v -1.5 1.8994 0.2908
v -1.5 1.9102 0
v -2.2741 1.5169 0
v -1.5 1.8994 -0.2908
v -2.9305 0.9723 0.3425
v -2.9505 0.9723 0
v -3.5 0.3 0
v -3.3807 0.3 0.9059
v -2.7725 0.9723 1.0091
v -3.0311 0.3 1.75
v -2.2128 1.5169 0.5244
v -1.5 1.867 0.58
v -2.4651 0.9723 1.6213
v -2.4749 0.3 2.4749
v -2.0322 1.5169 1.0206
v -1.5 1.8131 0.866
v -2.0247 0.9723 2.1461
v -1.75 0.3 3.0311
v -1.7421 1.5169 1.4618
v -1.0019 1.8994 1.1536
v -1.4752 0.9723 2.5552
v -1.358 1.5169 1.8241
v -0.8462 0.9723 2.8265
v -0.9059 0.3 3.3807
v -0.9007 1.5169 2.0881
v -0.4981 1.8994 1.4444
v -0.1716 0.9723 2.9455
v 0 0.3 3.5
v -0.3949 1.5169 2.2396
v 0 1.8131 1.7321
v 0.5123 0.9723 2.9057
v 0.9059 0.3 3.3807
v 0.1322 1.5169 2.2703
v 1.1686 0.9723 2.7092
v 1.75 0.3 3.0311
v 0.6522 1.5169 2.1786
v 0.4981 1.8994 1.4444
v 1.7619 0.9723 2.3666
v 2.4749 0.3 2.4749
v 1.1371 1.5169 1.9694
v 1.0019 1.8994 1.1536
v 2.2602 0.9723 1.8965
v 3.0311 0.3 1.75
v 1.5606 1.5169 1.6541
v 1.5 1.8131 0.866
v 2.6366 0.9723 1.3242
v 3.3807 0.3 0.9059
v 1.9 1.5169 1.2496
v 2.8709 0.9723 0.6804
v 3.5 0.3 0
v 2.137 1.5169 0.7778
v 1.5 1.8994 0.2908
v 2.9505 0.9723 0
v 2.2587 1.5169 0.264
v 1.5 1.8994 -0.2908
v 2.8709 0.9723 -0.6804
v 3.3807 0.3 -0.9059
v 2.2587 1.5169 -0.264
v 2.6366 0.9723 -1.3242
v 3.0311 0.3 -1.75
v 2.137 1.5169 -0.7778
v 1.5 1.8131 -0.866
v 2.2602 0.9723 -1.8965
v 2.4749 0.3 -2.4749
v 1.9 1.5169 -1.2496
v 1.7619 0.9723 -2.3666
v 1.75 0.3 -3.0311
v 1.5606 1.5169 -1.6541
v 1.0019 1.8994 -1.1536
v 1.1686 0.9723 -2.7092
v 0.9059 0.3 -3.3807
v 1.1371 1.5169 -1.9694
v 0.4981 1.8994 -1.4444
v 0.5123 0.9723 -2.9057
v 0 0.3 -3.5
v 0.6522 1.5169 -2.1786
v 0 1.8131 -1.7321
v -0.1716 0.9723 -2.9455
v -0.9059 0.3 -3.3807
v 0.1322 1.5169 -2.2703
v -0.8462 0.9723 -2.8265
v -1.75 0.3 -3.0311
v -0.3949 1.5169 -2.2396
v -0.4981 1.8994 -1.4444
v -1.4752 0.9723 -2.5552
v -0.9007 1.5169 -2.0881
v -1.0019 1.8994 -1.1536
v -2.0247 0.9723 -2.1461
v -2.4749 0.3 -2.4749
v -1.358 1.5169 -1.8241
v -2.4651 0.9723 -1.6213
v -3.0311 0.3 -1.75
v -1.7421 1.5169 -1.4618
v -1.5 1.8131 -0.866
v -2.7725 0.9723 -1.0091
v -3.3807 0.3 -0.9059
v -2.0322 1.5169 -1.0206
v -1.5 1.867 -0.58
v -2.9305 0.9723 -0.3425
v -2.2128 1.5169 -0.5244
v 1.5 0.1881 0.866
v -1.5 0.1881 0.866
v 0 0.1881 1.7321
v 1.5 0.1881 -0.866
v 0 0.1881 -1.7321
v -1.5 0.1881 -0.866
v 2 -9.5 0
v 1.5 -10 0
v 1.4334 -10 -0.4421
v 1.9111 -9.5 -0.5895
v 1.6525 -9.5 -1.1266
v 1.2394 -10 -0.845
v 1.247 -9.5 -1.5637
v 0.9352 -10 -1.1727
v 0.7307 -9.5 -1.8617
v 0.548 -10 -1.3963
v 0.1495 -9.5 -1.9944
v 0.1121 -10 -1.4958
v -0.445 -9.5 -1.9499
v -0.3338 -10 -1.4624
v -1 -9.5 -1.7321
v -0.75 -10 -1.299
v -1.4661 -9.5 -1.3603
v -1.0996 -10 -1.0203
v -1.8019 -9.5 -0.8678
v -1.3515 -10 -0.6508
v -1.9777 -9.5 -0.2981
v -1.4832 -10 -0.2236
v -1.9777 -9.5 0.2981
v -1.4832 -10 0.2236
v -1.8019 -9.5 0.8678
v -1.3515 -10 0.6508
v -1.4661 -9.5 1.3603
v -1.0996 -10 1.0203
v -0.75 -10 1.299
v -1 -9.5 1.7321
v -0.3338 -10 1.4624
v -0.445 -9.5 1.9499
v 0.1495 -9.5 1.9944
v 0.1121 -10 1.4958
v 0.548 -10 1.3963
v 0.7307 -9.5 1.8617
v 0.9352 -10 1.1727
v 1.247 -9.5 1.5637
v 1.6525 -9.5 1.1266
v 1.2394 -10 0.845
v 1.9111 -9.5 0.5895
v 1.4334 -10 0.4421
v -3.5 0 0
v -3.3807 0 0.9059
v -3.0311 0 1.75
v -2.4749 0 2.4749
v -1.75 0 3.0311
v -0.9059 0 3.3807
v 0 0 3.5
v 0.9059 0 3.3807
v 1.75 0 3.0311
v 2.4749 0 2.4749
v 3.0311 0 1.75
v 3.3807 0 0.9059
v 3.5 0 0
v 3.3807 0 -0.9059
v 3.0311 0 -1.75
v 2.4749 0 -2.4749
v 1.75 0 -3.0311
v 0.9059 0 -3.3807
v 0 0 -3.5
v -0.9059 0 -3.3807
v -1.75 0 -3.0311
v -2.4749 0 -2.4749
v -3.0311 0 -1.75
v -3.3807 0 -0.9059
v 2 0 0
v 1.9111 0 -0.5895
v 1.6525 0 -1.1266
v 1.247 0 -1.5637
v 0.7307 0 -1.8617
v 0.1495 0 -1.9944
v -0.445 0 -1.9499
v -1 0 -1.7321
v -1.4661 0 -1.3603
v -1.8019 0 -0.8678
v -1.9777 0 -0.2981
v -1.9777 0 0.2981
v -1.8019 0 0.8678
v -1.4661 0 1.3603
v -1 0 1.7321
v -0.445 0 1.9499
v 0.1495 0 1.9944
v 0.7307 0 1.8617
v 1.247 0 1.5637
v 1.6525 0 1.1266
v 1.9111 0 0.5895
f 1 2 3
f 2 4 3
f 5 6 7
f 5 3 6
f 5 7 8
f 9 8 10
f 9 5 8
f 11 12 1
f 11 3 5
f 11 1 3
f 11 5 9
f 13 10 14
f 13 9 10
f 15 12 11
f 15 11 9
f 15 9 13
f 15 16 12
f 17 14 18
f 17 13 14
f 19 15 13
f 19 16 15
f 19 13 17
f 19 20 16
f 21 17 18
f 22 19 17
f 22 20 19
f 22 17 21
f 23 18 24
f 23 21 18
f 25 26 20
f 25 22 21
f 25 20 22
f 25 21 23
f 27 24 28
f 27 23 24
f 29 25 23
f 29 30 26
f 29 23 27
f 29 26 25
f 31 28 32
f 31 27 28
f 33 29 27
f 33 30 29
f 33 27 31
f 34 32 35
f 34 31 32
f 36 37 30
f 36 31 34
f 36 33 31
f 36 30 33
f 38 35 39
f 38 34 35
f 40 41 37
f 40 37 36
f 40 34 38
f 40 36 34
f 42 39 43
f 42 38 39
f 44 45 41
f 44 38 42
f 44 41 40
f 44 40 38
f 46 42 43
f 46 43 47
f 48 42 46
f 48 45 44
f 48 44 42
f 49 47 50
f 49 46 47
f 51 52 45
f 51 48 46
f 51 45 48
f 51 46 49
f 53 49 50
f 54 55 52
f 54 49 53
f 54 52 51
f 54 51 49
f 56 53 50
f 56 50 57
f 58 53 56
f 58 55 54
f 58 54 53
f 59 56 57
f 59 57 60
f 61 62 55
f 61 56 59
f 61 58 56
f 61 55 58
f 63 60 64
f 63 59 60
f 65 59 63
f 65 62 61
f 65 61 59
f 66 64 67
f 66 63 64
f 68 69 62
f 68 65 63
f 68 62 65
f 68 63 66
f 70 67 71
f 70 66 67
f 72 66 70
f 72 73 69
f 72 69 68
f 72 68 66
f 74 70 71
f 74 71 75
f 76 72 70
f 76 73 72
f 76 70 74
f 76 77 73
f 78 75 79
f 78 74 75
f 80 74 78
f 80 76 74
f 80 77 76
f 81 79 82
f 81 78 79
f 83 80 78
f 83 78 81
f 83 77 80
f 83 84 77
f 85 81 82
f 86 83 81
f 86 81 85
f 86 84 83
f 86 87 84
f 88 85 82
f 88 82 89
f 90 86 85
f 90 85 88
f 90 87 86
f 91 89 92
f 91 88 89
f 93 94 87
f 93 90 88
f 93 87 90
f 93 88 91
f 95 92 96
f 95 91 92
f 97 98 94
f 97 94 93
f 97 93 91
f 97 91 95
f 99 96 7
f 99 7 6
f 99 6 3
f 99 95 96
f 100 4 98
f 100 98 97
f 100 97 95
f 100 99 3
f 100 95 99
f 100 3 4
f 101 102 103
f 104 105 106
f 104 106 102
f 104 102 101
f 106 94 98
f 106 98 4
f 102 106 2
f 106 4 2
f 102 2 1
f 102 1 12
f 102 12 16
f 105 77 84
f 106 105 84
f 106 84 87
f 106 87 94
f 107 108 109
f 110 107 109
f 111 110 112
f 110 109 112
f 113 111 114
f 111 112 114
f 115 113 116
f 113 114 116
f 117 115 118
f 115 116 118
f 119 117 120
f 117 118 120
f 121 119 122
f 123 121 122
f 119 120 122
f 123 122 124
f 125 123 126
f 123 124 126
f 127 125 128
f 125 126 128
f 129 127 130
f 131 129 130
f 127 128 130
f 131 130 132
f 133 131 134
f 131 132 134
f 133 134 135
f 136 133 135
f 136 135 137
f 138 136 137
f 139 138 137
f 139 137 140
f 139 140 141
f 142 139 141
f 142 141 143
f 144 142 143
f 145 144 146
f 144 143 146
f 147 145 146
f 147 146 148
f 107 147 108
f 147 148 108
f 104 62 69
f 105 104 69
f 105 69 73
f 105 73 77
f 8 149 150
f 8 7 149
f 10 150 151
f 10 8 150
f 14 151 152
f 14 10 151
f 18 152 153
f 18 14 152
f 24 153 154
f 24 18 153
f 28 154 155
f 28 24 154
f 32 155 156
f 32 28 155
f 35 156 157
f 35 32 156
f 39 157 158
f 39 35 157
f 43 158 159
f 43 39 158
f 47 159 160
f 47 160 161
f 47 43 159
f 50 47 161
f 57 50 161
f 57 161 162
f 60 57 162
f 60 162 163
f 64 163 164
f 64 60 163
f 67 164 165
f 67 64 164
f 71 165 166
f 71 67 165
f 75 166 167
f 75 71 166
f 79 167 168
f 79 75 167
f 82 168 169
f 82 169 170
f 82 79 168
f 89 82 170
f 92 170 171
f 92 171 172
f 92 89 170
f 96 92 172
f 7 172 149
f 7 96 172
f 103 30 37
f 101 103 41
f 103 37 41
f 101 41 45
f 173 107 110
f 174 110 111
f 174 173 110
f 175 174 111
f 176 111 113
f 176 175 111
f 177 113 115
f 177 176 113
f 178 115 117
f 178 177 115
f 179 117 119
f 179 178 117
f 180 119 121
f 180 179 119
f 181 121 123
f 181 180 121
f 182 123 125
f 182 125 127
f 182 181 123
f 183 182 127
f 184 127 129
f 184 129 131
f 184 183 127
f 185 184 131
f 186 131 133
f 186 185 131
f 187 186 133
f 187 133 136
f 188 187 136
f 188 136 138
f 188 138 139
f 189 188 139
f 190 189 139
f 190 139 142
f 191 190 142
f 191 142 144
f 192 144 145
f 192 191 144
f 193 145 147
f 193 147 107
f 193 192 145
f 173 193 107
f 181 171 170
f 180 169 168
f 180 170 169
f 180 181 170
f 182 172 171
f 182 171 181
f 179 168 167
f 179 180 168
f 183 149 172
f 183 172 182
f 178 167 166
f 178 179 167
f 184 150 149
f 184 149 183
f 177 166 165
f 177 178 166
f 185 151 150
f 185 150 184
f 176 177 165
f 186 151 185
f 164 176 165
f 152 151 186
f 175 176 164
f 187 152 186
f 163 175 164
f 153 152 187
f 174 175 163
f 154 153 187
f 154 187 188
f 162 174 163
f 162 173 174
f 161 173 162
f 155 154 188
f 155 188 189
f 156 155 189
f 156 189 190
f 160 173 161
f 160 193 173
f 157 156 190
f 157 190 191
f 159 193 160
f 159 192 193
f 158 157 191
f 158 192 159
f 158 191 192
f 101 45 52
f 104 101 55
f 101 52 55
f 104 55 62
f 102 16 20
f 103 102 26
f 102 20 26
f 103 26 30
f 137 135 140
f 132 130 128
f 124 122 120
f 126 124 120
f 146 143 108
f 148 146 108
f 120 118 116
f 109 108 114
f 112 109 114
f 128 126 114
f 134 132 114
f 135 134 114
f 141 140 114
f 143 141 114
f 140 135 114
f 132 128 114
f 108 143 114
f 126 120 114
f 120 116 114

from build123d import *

# Parameters (mm, degrees)
SKETCH1_R           = 2
BOSS_EXTRUDE3_DEPTH = 10
CHAMFER2_SIZE       = 0.5
CUT_EXTRUDE2_DEPTH  = 2


with BuildPart() as part:
    # Sketch1 → Boss-Extrude3 (new body)
    with BuildSketch(Plane(origin=(0, 0, 0), x_dir=(1, 0, 0), z_dir=(0, 1, 0))):
        Circle(SKETCH1_R)
    extrude(amount=-BOSS_EXTRUDE3_DEPTH)

    # Sketch3 → Revolve2 (revolve)
    with BuildSketch(Plane.XY):
        with BuildLine():
            Line((-3.5, 0), (-3.5, 0.3))
            ThreePointArc((-3.5, 0.3), (-1.988393808, 1.6859585), (0, 2.188078318))
            Line((0, 2.188078318), (0, 0))
            Line((0, 0), (-3.5, 0))
        make_face()
    revolve(axis=Axis((0, -2, 0), (0, 1, 0)))

    # Chamfer2
    chamfer2_edges = [part.edges().sort_by_distance(p)[0] for p in [
        (-2, -10, 0),
    ]]
    chamfer(chamfer2_edges, length=CHAMFER2_SIZE)

    # Sketch4 → Cut-Extrude2 (cut)
    with BuildSketch(Plane(origin=(0, 2.188078318, 0), x_dir=(1, 0, 0), z_dir=(0, 1, 0))):
        Polygon((0, 1.732050808), (-1.5, 0.866025404), (-1.5, -0.866025404), (0, -1.732050808), (1.5, -0.866025404), (1.5, 0.866025404), align=None)
    extrude(amount=-CUT_EXTRUDE2_DEPTH, mode=Mode.SUBTRACT)


solid = part.part
